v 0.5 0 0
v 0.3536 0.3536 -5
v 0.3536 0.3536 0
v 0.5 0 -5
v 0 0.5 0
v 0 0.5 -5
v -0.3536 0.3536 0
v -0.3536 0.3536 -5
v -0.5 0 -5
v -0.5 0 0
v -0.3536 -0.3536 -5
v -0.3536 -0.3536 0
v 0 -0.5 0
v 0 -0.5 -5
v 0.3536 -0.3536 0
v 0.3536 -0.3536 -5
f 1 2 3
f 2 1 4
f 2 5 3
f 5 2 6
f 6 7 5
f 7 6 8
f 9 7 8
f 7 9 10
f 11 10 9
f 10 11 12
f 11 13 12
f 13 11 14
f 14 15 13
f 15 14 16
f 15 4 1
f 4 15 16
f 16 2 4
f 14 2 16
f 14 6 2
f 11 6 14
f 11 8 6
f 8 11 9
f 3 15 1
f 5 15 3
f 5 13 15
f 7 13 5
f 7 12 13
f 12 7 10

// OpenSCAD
// file: lib.scad
function x(v) = v[0];
function y(v) = v[1];
function z(v) = v[2];
function add(v1,v2) = [ for (i = [ 0 : len(v1)-1 ]) v1[i] + v2[i] ];
function xv(d) = [d,0,0];
function yv(d) = [0,d,0];
function zv(d) = [0,0,d];

module box(v) { cube(size=v, center=true); }
module cyl(r1,r2,h) { cylinder(r1=r1, r2=r2, h=h, center=true); }

function grow(n,v) = [x(v)+n*2, y(v)+n*2, z(v)+n*2];

module rbox(v, radius=1) {
	cx = x(v)/2-radius;
	cy = y(v)/2-radius;
	cz = z(v)/2-radius;

	hull() {
		translate([cx,cy,cz]) sphere(r=radius);
		translate([cx,cy,-cz]) sphere(r=radius);
		translate([cx,-cy,cz]) sphere(r=radius);
		translate([cx,-cy,-cz]) sphere(r=radius);
		translate([-cx,cy,cz]) sphere(r=radius);
		translate([-cx,cy,-cz]) sphere(r=radius);
		translate([-cx,-cy,cz]) sphere(r=radius);
		translate([-cx,-cy,-cz]) sphere(r=radius);
	}
}

module fillet(r=1) {
  minkowski() {
    difference() {
      children();
      minkowski() {
        difference() {
          minkowski() {
            children();
            sphere(r=r);
          }
          children();
        }
        sphere(r=r);
      }
    }
    sphere(r=r);
  }
}
// main file
use <lib.scad>

module chassis() {
	translate([0,0,1.5]) box([3,3,3]);
}

module pipe() {
	translate([0,0,-2.5]) cyl(0.5, 0.5, 5);
}

hd=72;
ld=8;

//chassis($fn=hd);
//chassis($fn=ld);
//pipe($fn=hd);
pipe($fn=ld);
